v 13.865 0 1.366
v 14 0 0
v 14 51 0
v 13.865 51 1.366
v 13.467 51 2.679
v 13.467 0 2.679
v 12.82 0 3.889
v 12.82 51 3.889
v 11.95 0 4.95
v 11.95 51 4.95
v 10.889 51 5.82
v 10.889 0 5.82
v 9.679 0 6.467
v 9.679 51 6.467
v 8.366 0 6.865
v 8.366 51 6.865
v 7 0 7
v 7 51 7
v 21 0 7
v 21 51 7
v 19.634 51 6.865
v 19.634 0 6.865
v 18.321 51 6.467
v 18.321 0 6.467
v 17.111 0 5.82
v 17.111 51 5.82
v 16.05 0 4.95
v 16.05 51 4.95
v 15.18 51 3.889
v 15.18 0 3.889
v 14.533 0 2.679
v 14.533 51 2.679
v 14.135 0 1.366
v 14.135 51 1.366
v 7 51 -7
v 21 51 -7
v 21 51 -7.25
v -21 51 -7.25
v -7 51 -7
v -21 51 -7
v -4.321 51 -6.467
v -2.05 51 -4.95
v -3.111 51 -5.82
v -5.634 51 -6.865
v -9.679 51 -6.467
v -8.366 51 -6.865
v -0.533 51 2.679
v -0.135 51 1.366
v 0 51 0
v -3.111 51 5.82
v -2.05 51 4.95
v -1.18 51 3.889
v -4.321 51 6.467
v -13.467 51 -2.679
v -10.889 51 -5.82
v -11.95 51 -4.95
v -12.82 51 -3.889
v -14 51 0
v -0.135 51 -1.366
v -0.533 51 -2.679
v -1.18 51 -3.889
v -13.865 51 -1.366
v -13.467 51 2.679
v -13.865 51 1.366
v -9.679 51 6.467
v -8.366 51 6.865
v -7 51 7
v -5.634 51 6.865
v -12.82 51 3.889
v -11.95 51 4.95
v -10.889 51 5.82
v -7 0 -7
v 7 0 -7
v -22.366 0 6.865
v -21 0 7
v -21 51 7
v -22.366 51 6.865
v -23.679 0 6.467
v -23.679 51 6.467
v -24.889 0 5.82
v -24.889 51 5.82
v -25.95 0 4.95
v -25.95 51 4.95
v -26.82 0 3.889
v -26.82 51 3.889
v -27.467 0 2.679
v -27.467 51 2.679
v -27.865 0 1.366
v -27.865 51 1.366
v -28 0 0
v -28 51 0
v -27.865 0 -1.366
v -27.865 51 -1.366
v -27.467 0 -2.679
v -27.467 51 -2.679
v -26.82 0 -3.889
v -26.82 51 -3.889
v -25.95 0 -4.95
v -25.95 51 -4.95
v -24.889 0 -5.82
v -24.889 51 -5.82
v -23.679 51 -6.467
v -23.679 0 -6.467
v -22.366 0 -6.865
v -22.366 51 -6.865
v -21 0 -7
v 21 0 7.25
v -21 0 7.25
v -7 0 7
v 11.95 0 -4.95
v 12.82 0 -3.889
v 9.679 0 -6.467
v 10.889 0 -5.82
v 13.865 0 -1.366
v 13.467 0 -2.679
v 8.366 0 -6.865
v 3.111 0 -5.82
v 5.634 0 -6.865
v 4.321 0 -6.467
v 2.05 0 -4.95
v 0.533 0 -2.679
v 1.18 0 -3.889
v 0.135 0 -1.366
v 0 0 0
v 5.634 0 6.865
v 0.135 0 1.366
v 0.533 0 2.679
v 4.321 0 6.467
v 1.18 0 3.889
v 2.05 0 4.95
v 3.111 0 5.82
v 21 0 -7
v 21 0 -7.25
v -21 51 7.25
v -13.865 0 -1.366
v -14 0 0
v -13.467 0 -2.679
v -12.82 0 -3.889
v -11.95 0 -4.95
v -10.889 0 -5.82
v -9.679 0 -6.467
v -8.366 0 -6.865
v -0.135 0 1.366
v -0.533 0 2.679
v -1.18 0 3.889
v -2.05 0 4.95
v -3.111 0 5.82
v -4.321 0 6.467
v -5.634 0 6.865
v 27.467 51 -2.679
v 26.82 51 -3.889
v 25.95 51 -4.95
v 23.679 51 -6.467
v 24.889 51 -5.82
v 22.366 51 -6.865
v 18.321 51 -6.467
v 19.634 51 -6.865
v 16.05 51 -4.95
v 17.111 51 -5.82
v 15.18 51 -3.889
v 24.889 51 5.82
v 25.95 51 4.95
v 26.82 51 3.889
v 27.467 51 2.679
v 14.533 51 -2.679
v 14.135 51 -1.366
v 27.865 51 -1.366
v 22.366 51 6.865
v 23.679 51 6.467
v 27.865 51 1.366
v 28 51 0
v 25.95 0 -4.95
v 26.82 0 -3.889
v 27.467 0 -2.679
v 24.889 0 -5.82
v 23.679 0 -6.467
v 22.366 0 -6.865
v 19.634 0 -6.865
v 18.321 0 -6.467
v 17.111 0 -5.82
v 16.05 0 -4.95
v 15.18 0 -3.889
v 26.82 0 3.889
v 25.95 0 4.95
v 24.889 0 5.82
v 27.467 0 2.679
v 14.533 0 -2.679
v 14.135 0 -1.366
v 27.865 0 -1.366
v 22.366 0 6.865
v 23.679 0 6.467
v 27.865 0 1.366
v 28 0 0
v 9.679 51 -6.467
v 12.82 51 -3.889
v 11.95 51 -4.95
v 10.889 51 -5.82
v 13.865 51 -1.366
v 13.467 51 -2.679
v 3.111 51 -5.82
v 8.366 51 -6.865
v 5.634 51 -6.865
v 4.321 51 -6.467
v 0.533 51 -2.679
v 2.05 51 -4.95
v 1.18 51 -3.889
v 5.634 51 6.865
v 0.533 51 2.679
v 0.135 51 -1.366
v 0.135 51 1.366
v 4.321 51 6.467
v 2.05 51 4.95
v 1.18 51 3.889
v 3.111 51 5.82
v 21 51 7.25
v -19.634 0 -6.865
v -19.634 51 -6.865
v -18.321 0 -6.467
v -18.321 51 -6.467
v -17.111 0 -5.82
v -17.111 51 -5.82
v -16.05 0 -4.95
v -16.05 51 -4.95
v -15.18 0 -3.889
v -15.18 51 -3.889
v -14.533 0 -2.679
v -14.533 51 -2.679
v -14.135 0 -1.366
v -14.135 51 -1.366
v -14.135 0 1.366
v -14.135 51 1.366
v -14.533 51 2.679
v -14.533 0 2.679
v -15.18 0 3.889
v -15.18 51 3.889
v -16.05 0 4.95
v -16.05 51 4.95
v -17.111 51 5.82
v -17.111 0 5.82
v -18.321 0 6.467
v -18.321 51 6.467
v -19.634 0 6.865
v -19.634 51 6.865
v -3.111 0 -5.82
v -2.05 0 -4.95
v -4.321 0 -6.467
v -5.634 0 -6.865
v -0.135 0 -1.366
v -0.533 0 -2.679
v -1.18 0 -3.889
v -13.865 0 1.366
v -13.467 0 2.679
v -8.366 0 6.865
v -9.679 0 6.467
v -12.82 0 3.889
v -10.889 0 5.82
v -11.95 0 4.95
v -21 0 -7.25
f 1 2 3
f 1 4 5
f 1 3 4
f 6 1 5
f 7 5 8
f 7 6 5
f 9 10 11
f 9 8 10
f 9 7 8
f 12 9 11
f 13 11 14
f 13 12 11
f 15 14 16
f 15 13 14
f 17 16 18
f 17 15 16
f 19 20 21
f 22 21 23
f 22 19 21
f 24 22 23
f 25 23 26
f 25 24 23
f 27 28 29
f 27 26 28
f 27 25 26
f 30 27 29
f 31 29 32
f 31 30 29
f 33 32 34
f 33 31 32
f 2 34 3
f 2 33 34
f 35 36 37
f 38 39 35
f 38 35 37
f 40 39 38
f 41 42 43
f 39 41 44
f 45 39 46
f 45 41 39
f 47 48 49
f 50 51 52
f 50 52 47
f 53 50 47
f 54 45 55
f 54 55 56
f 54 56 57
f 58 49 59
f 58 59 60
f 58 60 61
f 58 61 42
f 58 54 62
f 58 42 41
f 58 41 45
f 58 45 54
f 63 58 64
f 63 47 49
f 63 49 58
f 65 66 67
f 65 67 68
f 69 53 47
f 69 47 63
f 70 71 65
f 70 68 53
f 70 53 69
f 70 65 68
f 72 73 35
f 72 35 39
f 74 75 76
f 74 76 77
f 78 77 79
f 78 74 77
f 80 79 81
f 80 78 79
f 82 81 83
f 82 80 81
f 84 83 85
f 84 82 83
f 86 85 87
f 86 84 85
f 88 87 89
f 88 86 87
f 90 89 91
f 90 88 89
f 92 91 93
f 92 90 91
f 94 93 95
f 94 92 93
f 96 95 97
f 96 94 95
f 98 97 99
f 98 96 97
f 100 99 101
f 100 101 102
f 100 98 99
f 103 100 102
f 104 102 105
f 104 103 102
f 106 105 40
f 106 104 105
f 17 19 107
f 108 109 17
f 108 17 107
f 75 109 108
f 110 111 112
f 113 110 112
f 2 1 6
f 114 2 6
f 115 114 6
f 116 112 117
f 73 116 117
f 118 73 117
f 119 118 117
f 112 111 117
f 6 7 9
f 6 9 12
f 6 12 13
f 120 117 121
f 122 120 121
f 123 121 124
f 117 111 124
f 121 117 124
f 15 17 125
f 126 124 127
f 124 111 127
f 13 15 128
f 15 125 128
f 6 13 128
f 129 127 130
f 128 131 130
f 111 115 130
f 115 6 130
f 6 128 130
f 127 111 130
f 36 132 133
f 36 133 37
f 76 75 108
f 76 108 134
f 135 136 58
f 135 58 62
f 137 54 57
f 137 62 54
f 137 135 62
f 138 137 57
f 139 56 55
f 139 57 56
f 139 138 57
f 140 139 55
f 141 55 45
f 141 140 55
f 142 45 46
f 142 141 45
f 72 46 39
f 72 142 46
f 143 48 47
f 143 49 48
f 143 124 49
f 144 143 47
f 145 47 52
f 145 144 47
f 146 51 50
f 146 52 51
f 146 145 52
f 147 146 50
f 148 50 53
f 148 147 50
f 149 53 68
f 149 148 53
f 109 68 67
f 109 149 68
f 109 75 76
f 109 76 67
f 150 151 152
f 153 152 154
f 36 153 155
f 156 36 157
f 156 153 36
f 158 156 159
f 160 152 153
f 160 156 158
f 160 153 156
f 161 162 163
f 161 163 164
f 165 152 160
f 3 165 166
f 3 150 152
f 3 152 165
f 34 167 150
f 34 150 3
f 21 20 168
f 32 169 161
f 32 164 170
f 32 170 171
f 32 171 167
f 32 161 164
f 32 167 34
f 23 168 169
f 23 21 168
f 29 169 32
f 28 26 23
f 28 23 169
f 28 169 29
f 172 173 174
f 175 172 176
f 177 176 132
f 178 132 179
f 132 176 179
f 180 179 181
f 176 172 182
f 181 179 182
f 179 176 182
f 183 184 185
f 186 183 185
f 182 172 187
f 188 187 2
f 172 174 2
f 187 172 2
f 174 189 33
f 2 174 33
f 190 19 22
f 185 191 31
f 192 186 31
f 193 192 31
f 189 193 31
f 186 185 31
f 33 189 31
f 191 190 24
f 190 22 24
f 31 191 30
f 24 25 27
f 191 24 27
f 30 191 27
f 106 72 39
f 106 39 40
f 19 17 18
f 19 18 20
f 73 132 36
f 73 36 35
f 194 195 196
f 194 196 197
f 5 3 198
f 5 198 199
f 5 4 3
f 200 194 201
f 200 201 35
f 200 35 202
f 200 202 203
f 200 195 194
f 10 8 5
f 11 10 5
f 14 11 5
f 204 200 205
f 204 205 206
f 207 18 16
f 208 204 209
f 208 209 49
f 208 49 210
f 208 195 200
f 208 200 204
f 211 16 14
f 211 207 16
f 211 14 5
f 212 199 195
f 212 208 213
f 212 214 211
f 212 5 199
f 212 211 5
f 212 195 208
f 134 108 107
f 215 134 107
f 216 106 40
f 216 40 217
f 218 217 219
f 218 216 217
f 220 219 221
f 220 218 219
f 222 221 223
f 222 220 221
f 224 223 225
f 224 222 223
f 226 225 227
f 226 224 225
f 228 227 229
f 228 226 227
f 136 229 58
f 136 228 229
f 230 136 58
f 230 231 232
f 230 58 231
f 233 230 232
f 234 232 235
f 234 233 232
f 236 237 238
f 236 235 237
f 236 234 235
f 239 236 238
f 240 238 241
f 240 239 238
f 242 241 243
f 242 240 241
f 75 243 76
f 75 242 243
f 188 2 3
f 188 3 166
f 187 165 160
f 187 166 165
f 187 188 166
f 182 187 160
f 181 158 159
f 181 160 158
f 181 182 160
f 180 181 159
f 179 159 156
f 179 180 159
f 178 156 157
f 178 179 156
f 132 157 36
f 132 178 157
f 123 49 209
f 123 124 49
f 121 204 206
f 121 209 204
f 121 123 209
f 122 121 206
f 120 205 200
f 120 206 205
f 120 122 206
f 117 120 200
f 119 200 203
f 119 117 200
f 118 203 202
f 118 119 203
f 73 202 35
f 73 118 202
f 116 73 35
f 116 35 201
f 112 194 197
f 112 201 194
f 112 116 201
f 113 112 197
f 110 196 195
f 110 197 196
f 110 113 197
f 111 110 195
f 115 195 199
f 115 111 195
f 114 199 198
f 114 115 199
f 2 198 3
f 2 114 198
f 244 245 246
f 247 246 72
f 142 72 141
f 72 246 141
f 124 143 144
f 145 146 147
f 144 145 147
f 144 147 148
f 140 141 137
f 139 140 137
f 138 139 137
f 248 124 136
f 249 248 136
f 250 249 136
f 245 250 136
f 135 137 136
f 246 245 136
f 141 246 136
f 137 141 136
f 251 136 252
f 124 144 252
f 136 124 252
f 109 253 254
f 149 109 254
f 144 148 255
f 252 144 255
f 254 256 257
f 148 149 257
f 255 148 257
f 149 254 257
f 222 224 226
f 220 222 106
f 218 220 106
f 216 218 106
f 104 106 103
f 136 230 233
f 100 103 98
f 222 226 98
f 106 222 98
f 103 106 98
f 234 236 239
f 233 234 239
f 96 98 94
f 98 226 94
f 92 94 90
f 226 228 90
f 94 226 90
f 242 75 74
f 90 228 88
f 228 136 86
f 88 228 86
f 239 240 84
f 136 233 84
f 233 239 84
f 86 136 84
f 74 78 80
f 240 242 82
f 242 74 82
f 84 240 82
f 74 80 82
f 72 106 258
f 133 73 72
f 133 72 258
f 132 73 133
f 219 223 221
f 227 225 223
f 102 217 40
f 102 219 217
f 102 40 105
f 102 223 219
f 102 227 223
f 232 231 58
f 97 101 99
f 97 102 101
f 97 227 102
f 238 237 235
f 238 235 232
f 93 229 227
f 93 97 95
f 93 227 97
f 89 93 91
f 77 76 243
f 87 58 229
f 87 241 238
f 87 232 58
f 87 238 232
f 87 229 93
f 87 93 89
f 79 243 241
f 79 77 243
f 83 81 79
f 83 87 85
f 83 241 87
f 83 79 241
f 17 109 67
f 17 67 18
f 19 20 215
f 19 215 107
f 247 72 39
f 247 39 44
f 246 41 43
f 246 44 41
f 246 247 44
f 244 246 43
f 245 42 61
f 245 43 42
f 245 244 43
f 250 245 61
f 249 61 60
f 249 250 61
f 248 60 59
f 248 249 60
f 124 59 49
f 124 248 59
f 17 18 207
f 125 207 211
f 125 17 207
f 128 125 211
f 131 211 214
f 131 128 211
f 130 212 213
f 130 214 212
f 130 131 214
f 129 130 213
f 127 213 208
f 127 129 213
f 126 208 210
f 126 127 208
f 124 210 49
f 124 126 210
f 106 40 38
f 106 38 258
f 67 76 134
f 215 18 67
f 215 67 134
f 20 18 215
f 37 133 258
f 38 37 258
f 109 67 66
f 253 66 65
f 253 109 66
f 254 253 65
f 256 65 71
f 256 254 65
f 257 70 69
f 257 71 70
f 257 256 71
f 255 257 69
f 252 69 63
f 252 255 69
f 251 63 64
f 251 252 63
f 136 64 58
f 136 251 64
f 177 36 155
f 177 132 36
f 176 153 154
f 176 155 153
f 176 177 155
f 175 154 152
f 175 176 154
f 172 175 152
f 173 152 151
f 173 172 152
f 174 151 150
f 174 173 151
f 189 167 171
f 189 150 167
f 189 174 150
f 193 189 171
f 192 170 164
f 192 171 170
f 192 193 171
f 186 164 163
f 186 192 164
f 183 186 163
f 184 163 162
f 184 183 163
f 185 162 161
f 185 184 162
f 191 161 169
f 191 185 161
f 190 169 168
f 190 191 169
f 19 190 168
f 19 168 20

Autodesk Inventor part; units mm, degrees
ref_plane "YZ Plane" through (0, 0, 0) normal (1, 0, 0) x (0, 1, 0)
ref_plane "XZ Plane" through (0, 0, 0) normal (0, 1, 0) x (-1, 0, 0)
sketch "スケッチ1" plane through (0, 0, 0) normal (0, 1, 0) x (-1, 0, 0)
  circle A0 centre (21, 0) radius 7
  circle A1 centre (7, 0) radius 7
  circle A2 centre (-7, 0) radius 7
  circle A3 centre (-21, 0) radius 7
  line L0 (37.3253, 0) -> (-37.3253, 0) construction
  line L1 (0, 20.4736) -> (0, -20.4736) construction
  point P0 (0, 0)
  point P1 (0, 0)
  point P2 (-14, 0)
  point P3 (0, 0)
  point P4 (14, 0)
  dimension "d0" = 14
  dimension "d1" = 14
  dimension "d2" = 14
  dimension "d3" = 14
extrude "押し出し1" add sketch "スケッチ1" along normal blind 51
ref_plane "作業平面1" through (0, 0, 7) normal (0, 0, 1) x (1, 0, 0)
sketch "スケッチ2" plane through (0, 0, 7) normal (0, 0, 1) x (1, 0, 0)
  line L0 (-21, 51) -> (21, 51)
  line L1 (21, 51) -> (21, 0)
  line L2 (21, 0) -> (-21, 0)
  line L3 (-21, 0) -> (-21, 51)
  point P0 (0, 0)
  point P1 (0, 0)
  dimension "d7" = 51
  dimension "d8" = 42
extrude "押し出し2" add sketch "スケッチ2" along normal blind 0.25
mirror "ミラー1" about plane through (0, 0, 0) normal (0, 0, 1) of "押し出し2"
equation "\"d1\" = d0"
equation "\"d2\" = d1"
equation "\"d3\" = d2"
equation "\"d7\" = d4"
equation "\"d8\" = 3 * d0"
equation "\"d6\" = 0.5 * d0"
equation "\"d4\" = 51"
properties part number "NiMH-Battery"
